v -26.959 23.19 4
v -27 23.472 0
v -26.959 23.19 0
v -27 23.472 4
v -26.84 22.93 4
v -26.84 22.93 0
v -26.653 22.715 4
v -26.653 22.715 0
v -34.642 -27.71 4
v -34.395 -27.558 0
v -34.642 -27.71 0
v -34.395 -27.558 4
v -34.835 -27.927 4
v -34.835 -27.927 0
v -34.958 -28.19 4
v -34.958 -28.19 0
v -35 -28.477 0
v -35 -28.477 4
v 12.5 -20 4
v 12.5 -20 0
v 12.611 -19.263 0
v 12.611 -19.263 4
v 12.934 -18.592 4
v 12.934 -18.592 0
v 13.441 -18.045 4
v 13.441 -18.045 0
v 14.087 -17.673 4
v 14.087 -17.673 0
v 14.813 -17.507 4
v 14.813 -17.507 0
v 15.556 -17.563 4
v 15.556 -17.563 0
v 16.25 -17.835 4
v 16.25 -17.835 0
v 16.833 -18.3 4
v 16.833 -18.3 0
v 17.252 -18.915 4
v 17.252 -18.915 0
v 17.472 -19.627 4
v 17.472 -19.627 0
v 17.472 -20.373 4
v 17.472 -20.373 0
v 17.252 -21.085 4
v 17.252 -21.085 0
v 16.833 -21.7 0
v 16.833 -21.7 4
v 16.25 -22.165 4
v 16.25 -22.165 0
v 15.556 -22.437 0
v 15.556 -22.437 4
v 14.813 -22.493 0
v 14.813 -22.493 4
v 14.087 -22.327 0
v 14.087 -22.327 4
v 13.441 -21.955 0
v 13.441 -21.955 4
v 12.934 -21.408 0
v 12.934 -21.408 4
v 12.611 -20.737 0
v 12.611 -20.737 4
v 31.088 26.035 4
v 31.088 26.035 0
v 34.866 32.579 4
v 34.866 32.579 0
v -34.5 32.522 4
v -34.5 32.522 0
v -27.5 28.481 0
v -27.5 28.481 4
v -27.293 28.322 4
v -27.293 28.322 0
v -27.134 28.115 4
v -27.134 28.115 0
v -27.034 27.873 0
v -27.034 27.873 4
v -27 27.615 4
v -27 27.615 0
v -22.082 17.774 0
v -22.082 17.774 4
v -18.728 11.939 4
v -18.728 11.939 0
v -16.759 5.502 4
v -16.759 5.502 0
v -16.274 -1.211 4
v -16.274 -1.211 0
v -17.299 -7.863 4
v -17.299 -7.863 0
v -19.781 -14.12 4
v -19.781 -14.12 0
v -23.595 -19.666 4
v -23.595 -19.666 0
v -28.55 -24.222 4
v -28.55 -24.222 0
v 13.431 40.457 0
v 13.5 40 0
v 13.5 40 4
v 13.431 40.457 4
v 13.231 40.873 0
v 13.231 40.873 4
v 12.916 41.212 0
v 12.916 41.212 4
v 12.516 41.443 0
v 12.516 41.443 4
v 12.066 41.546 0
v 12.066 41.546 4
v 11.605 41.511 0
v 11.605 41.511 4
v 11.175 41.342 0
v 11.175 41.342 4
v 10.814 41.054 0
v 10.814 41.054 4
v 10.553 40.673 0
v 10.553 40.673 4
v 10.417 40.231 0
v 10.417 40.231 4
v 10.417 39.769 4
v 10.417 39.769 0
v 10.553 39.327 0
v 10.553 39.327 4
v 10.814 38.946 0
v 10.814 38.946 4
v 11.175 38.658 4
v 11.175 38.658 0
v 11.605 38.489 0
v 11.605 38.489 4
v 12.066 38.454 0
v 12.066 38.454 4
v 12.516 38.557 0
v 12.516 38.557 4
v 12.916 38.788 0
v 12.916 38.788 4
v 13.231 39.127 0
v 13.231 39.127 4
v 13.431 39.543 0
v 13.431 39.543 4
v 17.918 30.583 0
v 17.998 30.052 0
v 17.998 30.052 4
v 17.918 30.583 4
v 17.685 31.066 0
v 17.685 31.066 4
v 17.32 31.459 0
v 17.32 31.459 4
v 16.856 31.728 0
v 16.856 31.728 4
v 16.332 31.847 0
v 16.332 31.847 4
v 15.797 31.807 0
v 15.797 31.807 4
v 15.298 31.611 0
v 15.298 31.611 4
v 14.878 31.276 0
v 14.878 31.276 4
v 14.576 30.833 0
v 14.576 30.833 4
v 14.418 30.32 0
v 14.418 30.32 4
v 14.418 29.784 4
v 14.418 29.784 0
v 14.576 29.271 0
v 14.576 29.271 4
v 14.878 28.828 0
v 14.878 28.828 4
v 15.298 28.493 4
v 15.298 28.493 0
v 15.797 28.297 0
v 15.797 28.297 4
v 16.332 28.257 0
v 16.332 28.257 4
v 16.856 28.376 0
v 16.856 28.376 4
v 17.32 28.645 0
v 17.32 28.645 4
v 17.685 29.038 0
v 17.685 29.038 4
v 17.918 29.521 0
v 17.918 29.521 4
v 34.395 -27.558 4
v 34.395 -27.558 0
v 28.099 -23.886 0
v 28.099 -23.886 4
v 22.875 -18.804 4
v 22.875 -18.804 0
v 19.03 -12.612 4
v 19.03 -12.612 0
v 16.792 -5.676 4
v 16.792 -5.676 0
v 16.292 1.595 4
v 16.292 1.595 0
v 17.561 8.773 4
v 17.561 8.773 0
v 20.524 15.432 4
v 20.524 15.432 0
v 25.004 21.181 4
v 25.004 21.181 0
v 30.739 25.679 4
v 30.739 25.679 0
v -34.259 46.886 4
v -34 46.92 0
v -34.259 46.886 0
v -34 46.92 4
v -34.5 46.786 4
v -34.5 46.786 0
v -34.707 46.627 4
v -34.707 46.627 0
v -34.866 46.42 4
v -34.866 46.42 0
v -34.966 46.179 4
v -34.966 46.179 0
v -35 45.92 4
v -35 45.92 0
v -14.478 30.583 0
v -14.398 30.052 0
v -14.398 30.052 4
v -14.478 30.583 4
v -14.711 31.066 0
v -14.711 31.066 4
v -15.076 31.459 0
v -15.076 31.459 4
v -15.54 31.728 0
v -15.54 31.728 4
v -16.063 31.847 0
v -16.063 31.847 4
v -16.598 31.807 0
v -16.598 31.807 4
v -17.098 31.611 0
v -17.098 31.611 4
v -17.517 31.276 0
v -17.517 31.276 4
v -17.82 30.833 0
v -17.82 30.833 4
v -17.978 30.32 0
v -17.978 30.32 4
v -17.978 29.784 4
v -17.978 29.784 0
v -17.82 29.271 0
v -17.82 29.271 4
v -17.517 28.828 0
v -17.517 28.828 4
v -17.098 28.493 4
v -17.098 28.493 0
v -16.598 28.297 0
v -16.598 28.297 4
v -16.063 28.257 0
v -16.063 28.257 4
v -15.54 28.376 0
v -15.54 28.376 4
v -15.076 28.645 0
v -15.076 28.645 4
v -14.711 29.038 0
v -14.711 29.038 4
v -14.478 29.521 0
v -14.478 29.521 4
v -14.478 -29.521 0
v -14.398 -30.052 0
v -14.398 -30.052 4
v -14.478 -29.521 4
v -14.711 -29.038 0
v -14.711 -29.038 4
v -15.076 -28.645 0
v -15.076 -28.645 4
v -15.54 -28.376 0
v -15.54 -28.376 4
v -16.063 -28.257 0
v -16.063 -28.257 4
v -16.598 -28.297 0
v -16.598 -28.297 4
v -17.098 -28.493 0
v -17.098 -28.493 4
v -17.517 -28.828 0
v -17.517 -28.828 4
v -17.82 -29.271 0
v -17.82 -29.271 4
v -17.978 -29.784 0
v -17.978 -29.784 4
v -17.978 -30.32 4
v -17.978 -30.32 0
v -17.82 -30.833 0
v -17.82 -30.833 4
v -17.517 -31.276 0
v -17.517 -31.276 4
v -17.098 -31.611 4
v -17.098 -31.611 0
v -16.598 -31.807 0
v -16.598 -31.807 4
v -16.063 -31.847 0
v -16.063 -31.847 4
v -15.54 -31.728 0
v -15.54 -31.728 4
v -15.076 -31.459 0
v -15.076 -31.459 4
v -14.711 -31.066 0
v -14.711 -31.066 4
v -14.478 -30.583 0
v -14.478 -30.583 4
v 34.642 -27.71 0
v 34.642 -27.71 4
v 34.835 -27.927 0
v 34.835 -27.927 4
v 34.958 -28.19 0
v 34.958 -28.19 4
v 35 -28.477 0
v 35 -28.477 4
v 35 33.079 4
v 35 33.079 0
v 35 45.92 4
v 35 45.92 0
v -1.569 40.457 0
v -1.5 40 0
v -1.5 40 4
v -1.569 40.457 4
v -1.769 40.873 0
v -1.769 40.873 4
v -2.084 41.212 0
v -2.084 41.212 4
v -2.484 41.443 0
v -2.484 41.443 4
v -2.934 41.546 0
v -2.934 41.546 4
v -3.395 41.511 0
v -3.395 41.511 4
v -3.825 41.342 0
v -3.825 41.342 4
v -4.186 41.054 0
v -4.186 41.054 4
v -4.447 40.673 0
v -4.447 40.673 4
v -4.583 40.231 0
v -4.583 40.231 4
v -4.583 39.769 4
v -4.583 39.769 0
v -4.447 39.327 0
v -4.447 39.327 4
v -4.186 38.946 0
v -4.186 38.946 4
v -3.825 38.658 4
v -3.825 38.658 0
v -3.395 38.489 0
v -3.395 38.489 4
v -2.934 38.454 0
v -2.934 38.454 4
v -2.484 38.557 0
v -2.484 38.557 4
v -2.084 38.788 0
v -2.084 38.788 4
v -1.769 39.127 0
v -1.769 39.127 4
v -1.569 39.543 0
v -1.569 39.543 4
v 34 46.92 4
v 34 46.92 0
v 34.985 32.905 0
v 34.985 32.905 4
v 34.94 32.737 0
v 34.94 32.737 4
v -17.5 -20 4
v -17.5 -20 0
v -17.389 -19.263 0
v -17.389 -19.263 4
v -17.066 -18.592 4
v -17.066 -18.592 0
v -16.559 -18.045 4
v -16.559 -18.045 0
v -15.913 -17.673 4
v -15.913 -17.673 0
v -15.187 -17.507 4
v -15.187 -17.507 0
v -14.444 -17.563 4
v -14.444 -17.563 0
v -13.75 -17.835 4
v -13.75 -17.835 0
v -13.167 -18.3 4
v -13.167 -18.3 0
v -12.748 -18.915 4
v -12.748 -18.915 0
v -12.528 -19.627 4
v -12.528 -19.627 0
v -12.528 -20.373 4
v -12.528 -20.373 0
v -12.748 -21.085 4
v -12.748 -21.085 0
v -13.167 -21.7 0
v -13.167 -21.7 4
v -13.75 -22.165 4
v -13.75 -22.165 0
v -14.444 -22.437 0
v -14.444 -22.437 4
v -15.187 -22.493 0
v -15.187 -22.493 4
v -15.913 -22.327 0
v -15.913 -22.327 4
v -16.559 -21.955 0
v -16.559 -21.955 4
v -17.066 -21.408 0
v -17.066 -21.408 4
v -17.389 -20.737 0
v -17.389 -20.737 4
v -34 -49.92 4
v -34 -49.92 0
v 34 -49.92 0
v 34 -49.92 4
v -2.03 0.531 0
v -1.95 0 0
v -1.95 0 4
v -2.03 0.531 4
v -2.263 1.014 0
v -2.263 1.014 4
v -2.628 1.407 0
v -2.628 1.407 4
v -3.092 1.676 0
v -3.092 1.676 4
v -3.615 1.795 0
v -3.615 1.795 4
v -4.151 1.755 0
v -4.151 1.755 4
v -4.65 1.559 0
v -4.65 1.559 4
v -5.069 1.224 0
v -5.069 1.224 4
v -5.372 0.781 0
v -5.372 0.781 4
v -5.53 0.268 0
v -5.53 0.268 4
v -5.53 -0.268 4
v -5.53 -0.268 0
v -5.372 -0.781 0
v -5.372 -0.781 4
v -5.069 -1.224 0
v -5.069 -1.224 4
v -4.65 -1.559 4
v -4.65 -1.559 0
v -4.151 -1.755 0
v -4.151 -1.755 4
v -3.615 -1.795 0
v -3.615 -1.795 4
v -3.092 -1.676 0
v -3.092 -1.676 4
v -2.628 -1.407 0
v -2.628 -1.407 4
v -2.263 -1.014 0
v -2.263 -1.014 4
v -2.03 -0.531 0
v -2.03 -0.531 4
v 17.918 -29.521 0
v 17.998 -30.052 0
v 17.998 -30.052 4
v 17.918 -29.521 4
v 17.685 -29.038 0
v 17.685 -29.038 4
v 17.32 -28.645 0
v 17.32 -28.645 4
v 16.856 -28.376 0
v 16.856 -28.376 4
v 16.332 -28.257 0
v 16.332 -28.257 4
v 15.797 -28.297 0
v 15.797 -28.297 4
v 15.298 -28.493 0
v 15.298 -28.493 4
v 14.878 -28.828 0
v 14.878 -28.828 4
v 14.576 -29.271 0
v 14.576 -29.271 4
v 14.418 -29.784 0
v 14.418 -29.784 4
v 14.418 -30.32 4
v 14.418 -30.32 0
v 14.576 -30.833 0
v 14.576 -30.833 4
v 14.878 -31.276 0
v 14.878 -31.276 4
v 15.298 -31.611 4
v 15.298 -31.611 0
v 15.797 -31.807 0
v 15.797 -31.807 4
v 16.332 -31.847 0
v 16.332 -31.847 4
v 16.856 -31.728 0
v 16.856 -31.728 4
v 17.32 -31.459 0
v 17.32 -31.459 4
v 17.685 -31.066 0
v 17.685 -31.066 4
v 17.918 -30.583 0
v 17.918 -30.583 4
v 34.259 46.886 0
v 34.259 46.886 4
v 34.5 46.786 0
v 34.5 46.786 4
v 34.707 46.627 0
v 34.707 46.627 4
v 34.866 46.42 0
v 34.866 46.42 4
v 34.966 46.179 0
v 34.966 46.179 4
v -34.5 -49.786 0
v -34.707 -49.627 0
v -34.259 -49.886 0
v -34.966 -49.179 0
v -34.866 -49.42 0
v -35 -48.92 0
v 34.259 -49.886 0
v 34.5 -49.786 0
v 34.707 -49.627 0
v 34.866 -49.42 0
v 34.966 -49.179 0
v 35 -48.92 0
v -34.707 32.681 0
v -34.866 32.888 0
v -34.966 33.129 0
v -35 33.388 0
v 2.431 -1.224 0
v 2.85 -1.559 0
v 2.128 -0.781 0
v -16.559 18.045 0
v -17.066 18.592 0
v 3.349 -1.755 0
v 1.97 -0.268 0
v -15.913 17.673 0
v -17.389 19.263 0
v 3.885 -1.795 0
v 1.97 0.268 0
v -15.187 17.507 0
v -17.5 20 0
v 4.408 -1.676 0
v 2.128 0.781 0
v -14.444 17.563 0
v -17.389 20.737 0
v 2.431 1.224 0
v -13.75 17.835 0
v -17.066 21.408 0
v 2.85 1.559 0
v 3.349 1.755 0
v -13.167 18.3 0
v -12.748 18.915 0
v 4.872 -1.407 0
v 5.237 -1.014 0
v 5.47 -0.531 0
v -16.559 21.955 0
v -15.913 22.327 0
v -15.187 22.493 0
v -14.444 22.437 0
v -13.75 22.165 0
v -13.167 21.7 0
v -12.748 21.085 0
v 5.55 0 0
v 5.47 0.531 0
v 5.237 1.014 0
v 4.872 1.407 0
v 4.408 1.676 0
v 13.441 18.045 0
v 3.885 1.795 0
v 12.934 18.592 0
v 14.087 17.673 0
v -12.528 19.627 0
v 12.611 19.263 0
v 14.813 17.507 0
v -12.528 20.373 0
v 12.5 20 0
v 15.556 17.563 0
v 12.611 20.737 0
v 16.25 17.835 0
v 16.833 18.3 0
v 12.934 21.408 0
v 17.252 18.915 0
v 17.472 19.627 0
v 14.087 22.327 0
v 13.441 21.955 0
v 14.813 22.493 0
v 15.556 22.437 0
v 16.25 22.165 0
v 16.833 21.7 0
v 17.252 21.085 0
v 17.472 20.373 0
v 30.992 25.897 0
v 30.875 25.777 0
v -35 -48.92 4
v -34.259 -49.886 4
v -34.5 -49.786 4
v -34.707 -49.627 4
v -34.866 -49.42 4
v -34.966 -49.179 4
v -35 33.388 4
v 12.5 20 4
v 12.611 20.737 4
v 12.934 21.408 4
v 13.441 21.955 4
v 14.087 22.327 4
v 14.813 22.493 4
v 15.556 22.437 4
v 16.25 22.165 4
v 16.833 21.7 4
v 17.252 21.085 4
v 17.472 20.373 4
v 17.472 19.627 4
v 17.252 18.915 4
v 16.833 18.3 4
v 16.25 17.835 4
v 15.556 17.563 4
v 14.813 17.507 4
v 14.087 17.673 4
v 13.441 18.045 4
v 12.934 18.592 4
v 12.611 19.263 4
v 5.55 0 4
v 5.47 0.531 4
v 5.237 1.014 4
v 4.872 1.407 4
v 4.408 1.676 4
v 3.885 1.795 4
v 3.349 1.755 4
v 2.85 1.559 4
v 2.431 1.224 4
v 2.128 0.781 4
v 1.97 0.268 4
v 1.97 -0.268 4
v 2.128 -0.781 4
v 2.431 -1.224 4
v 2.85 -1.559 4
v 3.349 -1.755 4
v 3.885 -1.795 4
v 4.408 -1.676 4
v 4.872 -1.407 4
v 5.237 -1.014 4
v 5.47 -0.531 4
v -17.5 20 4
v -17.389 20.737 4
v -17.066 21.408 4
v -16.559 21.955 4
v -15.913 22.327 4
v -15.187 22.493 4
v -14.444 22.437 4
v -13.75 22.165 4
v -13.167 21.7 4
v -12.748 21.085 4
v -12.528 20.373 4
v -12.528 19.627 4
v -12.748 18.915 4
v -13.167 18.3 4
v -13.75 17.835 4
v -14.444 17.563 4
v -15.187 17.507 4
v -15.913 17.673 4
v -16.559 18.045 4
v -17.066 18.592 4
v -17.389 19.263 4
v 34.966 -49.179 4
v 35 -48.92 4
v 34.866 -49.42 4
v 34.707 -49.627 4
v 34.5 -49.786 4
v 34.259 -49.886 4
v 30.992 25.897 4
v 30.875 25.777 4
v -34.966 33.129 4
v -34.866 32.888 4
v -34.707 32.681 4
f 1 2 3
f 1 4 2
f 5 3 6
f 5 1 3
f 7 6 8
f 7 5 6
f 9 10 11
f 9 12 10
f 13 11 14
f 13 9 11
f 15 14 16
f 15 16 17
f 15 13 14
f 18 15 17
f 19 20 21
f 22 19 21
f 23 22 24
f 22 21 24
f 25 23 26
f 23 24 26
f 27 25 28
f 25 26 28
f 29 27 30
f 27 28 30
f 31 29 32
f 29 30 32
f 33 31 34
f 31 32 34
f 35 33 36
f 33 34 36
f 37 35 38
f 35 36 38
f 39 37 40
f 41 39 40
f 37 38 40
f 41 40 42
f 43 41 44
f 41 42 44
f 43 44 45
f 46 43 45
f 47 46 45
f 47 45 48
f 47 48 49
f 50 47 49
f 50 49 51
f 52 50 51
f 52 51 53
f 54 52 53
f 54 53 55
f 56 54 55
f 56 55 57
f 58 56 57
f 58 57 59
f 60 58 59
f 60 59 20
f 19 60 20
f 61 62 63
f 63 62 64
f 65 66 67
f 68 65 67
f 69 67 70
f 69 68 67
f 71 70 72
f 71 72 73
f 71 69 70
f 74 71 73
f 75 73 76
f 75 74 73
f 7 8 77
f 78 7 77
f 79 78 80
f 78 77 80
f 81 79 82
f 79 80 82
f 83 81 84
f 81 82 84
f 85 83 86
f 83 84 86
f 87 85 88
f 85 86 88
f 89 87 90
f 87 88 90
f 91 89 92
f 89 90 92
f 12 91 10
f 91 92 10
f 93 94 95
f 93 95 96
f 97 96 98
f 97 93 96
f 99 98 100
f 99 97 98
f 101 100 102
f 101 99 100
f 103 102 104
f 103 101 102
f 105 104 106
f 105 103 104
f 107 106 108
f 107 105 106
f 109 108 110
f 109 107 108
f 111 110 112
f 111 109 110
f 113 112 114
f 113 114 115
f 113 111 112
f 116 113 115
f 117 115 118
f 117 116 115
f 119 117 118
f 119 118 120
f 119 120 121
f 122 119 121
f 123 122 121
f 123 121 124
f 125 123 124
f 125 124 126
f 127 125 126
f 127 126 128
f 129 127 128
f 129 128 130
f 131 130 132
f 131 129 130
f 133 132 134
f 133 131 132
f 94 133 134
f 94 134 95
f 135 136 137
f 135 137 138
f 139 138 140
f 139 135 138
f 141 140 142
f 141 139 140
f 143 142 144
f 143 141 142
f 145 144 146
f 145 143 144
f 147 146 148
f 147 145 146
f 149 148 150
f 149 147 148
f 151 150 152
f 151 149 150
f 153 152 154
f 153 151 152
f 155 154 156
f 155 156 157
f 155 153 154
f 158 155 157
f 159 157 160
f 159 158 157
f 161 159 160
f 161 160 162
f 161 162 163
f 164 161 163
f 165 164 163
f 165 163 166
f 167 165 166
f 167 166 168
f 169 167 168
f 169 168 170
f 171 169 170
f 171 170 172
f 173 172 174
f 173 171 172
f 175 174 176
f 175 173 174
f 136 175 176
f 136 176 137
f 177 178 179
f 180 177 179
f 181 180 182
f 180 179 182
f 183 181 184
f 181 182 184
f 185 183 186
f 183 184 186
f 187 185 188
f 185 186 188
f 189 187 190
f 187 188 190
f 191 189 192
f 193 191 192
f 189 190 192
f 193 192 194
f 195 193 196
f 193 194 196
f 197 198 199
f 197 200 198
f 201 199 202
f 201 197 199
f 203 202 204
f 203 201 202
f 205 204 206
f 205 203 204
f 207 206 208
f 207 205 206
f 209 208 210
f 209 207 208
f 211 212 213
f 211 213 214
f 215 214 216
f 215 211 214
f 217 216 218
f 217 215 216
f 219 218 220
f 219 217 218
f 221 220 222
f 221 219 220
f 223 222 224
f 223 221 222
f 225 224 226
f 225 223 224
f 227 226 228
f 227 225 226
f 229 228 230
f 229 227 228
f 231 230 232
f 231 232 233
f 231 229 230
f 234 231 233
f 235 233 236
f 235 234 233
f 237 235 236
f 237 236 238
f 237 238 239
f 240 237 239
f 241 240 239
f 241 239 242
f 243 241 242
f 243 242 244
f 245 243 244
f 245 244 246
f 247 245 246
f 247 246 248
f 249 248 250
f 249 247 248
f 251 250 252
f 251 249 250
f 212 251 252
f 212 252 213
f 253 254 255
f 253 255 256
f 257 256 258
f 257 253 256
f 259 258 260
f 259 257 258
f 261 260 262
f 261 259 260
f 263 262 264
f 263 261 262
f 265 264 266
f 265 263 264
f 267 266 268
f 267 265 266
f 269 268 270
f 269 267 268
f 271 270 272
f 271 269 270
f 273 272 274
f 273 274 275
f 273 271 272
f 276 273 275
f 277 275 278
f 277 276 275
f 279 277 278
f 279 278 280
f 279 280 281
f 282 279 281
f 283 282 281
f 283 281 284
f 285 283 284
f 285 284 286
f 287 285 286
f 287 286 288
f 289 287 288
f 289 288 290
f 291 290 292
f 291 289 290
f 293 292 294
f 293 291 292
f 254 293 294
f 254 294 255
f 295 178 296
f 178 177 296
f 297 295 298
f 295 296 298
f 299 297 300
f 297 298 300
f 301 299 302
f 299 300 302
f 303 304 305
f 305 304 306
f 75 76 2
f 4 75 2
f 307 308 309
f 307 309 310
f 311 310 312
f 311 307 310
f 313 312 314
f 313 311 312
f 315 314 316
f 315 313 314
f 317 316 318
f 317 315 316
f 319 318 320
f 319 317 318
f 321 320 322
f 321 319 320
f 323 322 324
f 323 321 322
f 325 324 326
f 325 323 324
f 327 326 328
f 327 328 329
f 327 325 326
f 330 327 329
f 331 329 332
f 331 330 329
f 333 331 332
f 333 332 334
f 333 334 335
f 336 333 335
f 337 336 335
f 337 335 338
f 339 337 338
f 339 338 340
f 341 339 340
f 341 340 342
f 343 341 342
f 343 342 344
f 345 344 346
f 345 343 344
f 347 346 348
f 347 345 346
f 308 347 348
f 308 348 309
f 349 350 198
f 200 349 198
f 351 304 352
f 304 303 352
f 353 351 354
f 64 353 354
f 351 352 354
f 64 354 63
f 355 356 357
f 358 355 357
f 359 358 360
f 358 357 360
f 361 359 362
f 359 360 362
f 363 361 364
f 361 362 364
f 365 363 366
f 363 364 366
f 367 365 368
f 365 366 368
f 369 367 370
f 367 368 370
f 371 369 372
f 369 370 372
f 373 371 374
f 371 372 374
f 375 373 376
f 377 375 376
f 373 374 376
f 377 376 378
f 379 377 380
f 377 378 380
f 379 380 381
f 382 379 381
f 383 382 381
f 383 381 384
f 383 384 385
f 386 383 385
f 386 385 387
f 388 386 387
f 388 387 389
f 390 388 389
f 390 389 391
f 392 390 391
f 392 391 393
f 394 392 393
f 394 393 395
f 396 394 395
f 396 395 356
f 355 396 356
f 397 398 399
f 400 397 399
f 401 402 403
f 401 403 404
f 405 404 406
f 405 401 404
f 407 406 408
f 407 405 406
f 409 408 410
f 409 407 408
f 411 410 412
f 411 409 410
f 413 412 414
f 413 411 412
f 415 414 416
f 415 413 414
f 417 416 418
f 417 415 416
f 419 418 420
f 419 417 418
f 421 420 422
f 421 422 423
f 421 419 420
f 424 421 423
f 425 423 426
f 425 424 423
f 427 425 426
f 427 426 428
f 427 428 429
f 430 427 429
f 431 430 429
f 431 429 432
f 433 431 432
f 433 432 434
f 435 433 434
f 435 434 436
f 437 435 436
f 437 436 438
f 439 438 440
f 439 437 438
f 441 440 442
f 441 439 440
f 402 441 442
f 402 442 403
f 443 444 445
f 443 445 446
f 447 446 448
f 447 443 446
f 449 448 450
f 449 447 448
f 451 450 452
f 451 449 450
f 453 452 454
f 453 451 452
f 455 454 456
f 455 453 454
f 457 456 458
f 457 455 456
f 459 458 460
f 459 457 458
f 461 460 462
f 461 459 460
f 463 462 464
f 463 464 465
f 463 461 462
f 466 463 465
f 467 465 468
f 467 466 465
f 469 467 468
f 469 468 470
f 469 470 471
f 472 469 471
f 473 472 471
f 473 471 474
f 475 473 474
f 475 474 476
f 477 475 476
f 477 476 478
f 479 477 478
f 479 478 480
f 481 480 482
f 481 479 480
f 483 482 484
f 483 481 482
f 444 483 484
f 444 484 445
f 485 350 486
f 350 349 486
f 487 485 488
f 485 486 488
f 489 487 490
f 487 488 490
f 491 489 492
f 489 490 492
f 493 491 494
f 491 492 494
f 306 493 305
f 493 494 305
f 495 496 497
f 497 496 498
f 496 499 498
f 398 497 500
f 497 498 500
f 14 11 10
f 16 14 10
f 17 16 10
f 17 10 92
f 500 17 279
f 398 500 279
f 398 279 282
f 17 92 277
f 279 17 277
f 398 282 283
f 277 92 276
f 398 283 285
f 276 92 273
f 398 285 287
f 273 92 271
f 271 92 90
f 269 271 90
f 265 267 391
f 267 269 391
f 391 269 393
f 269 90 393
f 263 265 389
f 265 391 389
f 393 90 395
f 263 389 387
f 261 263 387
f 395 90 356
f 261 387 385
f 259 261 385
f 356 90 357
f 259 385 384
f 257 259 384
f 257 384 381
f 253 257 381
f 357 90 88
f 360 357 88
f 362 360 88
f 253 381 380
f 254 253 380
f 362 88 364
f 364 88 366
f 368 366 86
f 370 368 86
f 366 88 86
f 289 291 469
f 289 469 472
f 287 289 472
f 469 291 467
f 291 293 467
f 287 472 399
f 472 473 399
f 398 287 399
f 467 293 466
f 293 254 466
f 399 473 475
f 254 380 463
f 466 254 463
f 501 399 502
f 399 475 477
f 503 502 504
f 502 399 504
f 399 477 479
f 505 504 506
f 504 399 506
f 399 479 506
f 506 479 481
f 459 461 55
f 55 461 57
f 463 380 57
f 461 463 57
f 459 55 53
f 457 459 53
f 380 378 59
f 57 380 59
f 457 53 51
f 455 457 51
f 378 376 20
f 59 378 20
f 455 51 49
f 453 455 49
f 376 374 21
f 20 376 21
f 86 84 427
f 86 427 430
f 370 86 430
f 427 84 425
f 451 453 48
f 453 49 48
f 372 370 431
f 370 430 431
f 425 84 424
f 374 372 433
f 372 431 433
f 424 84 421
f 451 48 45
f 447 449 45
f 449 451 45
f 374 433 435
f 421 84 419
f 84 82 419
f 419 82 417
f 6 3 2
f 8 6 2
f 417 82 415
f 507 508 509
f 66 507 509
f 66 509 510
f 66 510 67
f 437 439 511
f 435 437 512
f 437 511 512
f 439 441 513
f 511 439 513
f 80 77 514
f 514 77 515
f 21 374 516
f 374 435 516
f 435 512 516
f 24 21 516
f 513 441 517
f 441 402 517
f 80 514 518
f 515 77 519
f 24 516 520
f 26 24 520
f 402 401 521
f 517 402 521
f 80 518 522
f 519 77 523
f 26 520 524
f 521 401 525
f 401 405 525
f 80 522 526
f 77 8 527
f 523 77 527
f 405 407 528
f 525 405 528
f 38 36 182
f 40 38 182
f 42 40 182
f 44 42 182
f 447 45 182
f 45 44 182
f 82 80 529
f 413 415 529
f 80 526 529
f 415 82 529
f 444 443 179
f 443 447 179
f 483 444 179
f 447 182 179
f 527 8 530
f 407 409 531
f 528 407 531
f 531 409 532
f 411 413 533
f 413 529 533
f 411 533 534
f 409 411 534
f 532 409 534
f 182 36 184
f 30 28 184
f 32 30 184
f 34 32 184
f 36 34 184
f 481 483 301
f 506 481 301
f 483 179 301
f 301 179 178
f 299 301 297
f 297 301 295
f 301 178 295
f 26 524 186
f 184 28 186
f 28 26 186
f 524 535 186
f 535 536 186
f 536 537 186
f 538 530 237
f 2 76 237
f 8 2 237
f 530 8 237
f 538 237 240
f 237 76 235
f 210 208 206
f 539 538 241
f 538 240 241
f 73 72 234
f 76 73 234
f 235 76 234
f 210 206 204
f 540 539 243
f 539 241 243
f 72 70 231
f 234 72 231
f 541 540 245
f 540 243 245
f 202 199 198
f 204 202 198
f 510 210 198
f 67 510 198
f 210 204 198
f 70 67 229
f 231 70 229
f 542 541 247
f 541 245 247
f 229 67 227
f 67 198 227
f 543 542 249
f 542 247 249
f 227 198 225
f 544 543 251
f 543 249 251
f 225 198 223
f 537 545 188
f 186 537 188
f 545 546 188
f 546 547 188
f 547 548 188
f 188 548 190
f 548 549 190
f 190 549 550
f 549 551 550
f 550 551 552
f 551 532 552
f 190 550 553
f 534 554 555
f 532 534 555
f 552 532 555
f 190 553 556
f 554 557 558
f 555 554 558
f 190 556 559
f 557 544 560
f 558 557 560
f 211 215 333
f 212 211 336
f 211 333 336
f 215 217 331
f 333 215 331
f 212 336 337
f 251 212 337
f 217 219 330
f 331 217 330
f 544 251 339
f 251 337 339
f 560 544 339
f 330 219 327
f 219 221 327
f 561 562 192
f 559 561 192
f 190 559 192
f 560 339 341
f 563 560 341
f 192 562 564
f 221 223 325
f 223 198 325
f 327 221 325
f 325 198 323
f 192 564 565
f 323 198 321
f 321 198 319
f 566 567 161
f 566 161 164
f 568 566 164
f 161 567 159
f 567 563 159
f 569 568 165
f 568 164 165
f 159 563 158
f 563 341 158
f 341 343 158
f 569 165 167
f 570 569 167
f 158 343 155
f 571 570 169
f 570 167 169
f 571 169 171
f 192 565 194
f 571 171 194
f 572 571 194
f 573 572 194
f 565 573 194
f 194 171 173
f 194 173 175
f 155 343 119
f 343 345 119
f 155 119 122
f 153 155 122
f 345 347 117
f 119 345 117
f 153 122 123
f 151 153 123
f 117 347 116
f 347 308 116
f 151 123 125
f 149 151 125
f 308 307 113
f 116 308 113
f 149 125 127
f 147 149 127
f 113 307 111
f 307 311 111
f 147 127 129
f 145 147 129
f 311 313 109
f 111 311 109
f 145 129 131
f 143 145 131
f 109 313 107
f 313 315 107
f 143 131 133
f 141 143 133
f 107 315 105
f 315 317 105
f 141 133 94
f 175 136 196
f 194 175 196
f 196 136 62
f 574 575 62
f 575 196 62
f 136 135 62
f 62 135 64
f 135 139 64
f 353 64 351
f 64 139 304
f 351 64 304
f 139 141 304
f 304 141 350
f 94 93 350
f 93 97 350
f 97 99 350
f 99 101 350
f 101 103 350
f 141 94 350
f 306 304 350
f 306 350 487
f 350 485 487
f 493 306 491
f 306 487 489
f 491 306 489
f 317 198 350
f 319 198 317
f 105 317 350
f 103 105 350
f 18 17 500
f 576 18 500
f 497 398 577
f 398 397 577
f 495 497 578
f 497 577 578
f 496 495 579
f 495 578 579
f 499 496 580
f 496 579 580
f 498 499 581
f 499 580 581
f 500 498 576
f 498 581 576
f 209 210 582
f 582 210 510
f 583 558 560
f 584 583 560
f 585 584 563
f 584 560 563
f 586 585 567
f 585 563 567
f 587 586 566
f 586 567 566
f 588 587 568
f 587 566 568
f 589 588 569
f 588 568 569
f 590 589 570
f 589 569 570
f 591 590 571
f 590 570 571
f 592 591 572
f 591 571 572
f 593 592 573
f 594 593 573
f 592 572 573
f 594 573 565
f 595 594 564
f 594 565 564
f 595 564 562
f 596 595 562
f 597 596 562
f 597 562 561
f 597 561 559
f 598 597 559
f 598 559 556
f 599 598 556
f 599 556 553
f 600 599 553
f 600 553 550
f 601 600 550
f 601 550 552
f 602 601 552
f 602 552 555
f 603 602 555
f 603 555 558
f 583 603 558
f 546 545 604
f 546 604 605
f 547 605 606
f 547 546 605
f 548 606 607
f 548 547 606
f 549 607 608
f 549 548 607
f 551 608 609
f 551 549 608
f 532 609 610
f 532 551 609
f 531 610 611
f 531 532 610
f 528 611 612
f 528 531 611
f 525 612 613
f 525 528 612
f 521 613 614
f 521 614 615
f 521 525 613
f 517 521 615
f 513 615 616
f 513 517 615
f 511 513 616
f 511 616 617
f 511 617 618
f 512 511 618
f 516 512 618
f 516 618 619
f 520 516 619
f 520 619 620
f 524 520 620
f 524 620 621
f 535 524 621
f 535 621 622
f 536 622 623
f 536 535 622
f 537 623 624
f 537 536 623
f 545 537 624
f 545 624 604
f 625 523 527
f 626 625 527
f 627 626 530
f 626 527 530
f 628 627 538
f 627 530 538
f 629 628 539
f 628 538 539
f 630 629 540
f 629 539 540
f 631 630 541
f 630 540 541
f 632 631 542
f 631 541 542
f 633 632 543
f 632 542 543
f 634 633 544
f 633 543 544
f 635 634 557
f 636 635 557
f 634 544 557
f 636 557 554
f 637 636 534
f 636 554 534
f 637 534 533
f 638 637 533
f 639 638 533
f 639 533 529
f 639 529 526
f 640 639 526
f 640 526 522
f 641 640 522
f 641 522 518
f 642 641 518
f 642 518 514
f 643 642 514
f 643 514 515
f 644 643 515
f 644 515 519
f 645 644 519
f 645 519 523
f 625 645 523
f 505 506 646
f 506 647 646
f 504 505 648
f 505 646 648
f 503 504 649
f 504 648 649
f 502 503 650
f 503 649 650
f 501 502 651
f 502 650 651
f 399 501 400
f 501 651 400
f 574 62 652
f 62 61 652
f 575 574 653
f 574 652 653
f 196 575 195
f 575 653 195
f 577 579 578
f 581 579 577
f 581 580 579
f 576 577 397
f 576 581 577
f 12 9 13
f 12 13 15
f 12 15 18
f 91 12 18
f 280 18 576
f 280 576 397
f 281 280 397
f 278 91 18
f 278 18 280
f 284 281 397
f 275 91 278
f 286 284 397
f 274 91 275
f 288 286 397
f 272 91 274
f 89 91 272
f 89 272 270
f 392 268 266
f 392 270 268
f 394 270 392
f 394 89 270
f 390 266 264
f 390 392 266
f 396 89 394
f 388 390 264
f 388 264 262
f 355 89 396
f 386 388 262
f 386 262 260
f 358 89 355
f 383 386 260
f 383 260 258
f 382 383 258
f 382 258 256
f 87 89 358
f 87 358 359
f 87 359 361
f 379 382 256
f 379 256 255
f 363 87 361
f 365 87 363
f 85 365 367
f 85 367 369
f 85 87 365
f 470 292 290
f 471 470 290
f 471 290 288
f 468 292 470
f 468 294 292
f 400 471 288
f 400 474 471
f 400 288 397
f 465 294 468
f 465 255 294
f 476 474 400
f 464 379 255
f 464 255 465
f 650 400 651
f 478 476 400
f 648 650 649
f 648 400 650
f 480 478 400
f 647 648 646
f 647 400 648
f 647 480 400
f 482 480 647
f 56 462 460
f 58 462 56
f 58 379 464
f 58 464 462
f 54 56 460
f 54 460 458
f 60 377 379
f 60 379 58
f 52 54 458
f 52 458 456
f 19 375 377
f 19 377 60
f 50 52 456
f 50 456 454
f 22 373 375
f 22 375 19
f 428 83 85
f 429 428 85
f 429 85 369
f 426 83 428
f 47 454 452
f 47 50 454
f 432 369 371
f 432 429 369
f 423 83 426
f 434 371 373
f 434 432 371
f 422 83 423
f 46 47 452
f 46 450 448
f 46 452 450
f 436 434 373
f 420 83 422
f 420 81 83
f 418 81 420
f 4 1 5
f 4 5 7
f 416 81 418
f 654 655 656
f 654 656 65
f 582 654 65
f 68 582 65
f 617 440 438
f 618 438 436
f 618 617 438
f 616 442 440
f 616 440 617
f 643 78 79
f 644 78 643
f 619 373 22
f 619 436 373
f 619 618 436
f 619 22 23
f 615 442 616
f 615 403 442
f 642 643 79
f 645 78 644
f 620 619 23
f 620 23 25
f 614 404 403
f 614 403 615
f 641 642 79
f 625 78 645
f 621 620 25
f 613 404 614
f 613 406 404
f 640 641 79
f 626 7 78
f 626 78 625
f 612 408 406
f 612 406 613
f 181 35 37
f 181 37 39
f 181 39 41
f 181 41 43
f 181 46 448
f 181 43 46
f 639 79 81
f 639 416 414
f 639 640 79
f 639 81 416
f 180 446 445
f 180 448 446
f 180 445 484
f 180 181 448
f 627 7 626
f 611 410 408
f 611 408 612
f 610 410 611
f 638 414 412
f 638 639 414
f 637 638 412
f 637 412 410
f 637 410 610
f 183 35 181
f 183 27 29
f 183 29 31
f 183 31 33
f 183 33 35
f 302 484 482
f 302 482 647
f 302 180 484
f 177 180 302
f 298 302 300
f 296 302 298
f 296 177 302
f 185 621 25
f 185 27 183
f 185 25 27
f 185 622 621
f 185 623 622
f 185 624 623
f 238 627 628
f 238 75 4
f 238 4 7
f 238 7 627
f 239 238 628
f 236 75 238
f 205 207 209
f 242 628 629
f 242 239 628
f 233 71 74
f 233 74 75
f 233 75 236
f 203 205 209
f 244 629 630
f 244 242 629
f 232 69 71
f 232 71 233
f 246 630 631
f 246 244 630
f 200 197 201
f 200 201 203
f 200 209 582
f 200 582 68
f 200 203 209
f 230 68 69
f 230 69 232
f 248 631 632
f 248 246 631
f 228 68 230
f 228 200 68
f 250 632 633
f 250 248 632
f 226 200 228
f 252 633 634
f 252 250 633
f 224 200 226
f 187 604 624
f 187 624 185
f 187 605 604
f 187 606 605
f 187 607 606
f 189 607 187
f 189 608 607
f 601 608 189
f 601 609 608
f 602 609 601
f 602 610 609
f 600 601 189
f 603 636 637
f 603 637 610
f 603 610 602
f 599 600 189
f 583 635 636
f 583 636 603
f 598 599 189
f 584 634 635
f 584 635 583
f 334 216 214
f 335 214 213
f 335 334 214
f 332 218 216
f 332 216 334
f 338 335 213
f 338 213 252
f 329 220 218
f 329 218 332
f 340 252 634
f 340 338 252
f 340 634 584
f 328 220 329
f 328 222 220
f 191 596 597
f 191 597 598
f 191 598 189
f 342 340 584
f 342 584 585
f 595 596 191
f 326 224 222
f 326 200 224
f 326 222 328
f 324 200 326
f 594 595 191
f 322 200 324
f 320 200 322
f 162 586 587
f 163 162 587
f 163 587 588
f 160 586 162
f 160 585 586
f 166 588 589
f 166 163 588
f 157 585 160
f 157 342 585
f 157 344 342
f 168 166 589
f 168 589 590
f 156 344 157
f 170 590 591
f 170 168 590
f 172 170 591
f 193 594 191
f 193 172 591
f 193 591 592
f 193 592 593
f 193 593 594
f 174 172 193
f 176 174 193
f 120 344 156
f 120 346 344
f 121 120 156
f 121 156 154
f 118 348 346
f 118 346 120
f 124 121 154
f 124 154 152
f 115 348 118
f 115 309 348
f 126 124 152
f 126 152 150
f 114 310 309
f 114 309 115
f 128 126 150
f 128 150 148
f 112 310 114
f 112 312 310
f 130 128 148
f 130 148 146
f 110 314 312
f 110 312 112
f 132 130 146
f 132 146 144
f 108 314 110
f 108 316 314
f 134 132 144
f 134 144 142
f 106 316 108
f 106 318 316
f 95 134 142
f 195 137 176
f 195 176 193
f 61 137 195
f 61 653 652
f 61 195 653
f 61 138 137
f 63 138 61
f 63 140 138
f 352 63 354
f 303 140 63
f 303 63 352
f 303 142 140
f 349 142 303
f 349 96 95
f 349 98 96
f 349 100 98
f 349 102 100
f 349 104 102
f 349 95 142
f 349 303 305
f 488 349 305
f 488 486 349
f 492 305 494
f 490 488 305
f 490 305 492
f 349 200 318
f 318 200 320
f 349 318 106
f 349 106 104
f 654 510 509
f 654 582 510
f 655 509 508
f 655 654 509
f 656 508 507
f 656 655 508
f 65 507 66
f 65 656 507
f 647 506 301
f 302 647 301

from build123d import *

# Parameters (mm, degrees)
SKETCH_1_R          = 1.8
SKETCH_1_R_2        = 1.55
EXTRUDE_1_DEPTH     = 4
SKETCH_3_R          = 2.5
CUT_EXTRUDE_2_DEPTH = 10
FILLET_1_R          = 1


with BuildPart() as part:
    # 草图1 → 凸台-拉伸1 (new body)
    with BuildSketch(Plane.XY):
        with BuildLine():
            Line((35, 46.920144927), (-35, 46.920144927))
            Line((-35, 46.920144927), (-35, 32.810744327))
            Line((-35, 32.810744327), (-27, 28.191942173))
            Line((-27, 28.191942173), (-27, 23.009508904))
            ThreePointArc((-27, 23.009508904), (-16.614935725, -4.665079356), (-35, -27.810744327))
            Line((-35, -27.810744327), (-35, -46.920144927))
            Line((-35, -46.920144927), (-35, -49.920144927))
            Line((-35, -49.920144927), (35, -49.920144927))
            Line((35, -49.920144927), (35, -46.920144927))
            Line((35, -46.920144927), (35, -27.810744327))
            ThreePointArc((35, -27.810744327), (16.334866743, -2.254950607), (30.958156738, 25.81006644))
            Line((30.958156738, 25.81006644), (35, 32.810744327))
            Line((35, 32.810744327), (35, 46.920144927))
        make_face()
        with Locations((-16.1979618, -30.0520382)):
            Circle(SKETCH_1_R, mode=Mode.SUBTRACT)
        with Locations((16.1979618, -30.0520382)):
            Circle(SKETCH_1_R, mode=Mode.SUBTRACT)
        with Locations((-3.75, 0)):
            Circle(SKETCH_1_R, mode=Mode.SUBTRACT)
        with Locations((-16.1979618, 30.0520382)):
            Circle(SKETCH_1_R, mode=Mode.SUBTRACT)
        with Locations((-3.05, 40)):
            Circle(SKETCH_1_R_2, mode=Mode.SUBTRACT)
        with Locations((3.75, 0)):
            Circle(SKETCH_1_R, mode=Mode.SUBTRACT)
        with Locations((16.1979618, 30.0520382)):
            Circle(SKETCH_1_R, mode=Mode.SUBTRACT)
        with Locations((11.95, 40)):
            Circle(SKETCH_1_R_2, mode=Mode.SUBTRACT)
    extrude(amount=EXTRUDE_1_DEPTH)

    # 草图3 → 切除-拉伸2 (cut)
    with BuildSketch(Plane(origin=(0, 0, 0), x_dir=(-1, 0, 0), z_dir=(0, 0, -1))):
        with Locations((-15, 20)):
            Circle(SKETCH_3_R)
        with Locations((15, 20)):
            Circle(SKETCH_3_R)
        with Locations((15, -20)):
            Circle(SKETCH_3_R)
        with Locations((-15, -20)):
            Circle(SKETCH_3_R)
    extrude(amount=-CUT_EXTRUDE_2_DEPTH, mode=Mode.SUBTRACT)

    # 圆角1
    fillet_1_edges = [part.edges().sort_by_distance(p)[0] for p in [
        (35, -27.810744327, 2),
        (35, -49.920144927, 2),
        (-35, -49.920144927, 2),
        (-35, -27.810744327, 2),
        (-27, 23.009508904, 2),
        (-27, 28.191942173, 2),
        (-35, 32.810744327, 2),
        (-35, 46.920144927, 2),
        (35, 46.920144927, 2),
        (35, 32.810744327, 2),
        (30.958156738, 25.81006644, 2),
    ]]
    fillet(fillet_1_edges, radius=FILLET_1_R)


solid = part.part
